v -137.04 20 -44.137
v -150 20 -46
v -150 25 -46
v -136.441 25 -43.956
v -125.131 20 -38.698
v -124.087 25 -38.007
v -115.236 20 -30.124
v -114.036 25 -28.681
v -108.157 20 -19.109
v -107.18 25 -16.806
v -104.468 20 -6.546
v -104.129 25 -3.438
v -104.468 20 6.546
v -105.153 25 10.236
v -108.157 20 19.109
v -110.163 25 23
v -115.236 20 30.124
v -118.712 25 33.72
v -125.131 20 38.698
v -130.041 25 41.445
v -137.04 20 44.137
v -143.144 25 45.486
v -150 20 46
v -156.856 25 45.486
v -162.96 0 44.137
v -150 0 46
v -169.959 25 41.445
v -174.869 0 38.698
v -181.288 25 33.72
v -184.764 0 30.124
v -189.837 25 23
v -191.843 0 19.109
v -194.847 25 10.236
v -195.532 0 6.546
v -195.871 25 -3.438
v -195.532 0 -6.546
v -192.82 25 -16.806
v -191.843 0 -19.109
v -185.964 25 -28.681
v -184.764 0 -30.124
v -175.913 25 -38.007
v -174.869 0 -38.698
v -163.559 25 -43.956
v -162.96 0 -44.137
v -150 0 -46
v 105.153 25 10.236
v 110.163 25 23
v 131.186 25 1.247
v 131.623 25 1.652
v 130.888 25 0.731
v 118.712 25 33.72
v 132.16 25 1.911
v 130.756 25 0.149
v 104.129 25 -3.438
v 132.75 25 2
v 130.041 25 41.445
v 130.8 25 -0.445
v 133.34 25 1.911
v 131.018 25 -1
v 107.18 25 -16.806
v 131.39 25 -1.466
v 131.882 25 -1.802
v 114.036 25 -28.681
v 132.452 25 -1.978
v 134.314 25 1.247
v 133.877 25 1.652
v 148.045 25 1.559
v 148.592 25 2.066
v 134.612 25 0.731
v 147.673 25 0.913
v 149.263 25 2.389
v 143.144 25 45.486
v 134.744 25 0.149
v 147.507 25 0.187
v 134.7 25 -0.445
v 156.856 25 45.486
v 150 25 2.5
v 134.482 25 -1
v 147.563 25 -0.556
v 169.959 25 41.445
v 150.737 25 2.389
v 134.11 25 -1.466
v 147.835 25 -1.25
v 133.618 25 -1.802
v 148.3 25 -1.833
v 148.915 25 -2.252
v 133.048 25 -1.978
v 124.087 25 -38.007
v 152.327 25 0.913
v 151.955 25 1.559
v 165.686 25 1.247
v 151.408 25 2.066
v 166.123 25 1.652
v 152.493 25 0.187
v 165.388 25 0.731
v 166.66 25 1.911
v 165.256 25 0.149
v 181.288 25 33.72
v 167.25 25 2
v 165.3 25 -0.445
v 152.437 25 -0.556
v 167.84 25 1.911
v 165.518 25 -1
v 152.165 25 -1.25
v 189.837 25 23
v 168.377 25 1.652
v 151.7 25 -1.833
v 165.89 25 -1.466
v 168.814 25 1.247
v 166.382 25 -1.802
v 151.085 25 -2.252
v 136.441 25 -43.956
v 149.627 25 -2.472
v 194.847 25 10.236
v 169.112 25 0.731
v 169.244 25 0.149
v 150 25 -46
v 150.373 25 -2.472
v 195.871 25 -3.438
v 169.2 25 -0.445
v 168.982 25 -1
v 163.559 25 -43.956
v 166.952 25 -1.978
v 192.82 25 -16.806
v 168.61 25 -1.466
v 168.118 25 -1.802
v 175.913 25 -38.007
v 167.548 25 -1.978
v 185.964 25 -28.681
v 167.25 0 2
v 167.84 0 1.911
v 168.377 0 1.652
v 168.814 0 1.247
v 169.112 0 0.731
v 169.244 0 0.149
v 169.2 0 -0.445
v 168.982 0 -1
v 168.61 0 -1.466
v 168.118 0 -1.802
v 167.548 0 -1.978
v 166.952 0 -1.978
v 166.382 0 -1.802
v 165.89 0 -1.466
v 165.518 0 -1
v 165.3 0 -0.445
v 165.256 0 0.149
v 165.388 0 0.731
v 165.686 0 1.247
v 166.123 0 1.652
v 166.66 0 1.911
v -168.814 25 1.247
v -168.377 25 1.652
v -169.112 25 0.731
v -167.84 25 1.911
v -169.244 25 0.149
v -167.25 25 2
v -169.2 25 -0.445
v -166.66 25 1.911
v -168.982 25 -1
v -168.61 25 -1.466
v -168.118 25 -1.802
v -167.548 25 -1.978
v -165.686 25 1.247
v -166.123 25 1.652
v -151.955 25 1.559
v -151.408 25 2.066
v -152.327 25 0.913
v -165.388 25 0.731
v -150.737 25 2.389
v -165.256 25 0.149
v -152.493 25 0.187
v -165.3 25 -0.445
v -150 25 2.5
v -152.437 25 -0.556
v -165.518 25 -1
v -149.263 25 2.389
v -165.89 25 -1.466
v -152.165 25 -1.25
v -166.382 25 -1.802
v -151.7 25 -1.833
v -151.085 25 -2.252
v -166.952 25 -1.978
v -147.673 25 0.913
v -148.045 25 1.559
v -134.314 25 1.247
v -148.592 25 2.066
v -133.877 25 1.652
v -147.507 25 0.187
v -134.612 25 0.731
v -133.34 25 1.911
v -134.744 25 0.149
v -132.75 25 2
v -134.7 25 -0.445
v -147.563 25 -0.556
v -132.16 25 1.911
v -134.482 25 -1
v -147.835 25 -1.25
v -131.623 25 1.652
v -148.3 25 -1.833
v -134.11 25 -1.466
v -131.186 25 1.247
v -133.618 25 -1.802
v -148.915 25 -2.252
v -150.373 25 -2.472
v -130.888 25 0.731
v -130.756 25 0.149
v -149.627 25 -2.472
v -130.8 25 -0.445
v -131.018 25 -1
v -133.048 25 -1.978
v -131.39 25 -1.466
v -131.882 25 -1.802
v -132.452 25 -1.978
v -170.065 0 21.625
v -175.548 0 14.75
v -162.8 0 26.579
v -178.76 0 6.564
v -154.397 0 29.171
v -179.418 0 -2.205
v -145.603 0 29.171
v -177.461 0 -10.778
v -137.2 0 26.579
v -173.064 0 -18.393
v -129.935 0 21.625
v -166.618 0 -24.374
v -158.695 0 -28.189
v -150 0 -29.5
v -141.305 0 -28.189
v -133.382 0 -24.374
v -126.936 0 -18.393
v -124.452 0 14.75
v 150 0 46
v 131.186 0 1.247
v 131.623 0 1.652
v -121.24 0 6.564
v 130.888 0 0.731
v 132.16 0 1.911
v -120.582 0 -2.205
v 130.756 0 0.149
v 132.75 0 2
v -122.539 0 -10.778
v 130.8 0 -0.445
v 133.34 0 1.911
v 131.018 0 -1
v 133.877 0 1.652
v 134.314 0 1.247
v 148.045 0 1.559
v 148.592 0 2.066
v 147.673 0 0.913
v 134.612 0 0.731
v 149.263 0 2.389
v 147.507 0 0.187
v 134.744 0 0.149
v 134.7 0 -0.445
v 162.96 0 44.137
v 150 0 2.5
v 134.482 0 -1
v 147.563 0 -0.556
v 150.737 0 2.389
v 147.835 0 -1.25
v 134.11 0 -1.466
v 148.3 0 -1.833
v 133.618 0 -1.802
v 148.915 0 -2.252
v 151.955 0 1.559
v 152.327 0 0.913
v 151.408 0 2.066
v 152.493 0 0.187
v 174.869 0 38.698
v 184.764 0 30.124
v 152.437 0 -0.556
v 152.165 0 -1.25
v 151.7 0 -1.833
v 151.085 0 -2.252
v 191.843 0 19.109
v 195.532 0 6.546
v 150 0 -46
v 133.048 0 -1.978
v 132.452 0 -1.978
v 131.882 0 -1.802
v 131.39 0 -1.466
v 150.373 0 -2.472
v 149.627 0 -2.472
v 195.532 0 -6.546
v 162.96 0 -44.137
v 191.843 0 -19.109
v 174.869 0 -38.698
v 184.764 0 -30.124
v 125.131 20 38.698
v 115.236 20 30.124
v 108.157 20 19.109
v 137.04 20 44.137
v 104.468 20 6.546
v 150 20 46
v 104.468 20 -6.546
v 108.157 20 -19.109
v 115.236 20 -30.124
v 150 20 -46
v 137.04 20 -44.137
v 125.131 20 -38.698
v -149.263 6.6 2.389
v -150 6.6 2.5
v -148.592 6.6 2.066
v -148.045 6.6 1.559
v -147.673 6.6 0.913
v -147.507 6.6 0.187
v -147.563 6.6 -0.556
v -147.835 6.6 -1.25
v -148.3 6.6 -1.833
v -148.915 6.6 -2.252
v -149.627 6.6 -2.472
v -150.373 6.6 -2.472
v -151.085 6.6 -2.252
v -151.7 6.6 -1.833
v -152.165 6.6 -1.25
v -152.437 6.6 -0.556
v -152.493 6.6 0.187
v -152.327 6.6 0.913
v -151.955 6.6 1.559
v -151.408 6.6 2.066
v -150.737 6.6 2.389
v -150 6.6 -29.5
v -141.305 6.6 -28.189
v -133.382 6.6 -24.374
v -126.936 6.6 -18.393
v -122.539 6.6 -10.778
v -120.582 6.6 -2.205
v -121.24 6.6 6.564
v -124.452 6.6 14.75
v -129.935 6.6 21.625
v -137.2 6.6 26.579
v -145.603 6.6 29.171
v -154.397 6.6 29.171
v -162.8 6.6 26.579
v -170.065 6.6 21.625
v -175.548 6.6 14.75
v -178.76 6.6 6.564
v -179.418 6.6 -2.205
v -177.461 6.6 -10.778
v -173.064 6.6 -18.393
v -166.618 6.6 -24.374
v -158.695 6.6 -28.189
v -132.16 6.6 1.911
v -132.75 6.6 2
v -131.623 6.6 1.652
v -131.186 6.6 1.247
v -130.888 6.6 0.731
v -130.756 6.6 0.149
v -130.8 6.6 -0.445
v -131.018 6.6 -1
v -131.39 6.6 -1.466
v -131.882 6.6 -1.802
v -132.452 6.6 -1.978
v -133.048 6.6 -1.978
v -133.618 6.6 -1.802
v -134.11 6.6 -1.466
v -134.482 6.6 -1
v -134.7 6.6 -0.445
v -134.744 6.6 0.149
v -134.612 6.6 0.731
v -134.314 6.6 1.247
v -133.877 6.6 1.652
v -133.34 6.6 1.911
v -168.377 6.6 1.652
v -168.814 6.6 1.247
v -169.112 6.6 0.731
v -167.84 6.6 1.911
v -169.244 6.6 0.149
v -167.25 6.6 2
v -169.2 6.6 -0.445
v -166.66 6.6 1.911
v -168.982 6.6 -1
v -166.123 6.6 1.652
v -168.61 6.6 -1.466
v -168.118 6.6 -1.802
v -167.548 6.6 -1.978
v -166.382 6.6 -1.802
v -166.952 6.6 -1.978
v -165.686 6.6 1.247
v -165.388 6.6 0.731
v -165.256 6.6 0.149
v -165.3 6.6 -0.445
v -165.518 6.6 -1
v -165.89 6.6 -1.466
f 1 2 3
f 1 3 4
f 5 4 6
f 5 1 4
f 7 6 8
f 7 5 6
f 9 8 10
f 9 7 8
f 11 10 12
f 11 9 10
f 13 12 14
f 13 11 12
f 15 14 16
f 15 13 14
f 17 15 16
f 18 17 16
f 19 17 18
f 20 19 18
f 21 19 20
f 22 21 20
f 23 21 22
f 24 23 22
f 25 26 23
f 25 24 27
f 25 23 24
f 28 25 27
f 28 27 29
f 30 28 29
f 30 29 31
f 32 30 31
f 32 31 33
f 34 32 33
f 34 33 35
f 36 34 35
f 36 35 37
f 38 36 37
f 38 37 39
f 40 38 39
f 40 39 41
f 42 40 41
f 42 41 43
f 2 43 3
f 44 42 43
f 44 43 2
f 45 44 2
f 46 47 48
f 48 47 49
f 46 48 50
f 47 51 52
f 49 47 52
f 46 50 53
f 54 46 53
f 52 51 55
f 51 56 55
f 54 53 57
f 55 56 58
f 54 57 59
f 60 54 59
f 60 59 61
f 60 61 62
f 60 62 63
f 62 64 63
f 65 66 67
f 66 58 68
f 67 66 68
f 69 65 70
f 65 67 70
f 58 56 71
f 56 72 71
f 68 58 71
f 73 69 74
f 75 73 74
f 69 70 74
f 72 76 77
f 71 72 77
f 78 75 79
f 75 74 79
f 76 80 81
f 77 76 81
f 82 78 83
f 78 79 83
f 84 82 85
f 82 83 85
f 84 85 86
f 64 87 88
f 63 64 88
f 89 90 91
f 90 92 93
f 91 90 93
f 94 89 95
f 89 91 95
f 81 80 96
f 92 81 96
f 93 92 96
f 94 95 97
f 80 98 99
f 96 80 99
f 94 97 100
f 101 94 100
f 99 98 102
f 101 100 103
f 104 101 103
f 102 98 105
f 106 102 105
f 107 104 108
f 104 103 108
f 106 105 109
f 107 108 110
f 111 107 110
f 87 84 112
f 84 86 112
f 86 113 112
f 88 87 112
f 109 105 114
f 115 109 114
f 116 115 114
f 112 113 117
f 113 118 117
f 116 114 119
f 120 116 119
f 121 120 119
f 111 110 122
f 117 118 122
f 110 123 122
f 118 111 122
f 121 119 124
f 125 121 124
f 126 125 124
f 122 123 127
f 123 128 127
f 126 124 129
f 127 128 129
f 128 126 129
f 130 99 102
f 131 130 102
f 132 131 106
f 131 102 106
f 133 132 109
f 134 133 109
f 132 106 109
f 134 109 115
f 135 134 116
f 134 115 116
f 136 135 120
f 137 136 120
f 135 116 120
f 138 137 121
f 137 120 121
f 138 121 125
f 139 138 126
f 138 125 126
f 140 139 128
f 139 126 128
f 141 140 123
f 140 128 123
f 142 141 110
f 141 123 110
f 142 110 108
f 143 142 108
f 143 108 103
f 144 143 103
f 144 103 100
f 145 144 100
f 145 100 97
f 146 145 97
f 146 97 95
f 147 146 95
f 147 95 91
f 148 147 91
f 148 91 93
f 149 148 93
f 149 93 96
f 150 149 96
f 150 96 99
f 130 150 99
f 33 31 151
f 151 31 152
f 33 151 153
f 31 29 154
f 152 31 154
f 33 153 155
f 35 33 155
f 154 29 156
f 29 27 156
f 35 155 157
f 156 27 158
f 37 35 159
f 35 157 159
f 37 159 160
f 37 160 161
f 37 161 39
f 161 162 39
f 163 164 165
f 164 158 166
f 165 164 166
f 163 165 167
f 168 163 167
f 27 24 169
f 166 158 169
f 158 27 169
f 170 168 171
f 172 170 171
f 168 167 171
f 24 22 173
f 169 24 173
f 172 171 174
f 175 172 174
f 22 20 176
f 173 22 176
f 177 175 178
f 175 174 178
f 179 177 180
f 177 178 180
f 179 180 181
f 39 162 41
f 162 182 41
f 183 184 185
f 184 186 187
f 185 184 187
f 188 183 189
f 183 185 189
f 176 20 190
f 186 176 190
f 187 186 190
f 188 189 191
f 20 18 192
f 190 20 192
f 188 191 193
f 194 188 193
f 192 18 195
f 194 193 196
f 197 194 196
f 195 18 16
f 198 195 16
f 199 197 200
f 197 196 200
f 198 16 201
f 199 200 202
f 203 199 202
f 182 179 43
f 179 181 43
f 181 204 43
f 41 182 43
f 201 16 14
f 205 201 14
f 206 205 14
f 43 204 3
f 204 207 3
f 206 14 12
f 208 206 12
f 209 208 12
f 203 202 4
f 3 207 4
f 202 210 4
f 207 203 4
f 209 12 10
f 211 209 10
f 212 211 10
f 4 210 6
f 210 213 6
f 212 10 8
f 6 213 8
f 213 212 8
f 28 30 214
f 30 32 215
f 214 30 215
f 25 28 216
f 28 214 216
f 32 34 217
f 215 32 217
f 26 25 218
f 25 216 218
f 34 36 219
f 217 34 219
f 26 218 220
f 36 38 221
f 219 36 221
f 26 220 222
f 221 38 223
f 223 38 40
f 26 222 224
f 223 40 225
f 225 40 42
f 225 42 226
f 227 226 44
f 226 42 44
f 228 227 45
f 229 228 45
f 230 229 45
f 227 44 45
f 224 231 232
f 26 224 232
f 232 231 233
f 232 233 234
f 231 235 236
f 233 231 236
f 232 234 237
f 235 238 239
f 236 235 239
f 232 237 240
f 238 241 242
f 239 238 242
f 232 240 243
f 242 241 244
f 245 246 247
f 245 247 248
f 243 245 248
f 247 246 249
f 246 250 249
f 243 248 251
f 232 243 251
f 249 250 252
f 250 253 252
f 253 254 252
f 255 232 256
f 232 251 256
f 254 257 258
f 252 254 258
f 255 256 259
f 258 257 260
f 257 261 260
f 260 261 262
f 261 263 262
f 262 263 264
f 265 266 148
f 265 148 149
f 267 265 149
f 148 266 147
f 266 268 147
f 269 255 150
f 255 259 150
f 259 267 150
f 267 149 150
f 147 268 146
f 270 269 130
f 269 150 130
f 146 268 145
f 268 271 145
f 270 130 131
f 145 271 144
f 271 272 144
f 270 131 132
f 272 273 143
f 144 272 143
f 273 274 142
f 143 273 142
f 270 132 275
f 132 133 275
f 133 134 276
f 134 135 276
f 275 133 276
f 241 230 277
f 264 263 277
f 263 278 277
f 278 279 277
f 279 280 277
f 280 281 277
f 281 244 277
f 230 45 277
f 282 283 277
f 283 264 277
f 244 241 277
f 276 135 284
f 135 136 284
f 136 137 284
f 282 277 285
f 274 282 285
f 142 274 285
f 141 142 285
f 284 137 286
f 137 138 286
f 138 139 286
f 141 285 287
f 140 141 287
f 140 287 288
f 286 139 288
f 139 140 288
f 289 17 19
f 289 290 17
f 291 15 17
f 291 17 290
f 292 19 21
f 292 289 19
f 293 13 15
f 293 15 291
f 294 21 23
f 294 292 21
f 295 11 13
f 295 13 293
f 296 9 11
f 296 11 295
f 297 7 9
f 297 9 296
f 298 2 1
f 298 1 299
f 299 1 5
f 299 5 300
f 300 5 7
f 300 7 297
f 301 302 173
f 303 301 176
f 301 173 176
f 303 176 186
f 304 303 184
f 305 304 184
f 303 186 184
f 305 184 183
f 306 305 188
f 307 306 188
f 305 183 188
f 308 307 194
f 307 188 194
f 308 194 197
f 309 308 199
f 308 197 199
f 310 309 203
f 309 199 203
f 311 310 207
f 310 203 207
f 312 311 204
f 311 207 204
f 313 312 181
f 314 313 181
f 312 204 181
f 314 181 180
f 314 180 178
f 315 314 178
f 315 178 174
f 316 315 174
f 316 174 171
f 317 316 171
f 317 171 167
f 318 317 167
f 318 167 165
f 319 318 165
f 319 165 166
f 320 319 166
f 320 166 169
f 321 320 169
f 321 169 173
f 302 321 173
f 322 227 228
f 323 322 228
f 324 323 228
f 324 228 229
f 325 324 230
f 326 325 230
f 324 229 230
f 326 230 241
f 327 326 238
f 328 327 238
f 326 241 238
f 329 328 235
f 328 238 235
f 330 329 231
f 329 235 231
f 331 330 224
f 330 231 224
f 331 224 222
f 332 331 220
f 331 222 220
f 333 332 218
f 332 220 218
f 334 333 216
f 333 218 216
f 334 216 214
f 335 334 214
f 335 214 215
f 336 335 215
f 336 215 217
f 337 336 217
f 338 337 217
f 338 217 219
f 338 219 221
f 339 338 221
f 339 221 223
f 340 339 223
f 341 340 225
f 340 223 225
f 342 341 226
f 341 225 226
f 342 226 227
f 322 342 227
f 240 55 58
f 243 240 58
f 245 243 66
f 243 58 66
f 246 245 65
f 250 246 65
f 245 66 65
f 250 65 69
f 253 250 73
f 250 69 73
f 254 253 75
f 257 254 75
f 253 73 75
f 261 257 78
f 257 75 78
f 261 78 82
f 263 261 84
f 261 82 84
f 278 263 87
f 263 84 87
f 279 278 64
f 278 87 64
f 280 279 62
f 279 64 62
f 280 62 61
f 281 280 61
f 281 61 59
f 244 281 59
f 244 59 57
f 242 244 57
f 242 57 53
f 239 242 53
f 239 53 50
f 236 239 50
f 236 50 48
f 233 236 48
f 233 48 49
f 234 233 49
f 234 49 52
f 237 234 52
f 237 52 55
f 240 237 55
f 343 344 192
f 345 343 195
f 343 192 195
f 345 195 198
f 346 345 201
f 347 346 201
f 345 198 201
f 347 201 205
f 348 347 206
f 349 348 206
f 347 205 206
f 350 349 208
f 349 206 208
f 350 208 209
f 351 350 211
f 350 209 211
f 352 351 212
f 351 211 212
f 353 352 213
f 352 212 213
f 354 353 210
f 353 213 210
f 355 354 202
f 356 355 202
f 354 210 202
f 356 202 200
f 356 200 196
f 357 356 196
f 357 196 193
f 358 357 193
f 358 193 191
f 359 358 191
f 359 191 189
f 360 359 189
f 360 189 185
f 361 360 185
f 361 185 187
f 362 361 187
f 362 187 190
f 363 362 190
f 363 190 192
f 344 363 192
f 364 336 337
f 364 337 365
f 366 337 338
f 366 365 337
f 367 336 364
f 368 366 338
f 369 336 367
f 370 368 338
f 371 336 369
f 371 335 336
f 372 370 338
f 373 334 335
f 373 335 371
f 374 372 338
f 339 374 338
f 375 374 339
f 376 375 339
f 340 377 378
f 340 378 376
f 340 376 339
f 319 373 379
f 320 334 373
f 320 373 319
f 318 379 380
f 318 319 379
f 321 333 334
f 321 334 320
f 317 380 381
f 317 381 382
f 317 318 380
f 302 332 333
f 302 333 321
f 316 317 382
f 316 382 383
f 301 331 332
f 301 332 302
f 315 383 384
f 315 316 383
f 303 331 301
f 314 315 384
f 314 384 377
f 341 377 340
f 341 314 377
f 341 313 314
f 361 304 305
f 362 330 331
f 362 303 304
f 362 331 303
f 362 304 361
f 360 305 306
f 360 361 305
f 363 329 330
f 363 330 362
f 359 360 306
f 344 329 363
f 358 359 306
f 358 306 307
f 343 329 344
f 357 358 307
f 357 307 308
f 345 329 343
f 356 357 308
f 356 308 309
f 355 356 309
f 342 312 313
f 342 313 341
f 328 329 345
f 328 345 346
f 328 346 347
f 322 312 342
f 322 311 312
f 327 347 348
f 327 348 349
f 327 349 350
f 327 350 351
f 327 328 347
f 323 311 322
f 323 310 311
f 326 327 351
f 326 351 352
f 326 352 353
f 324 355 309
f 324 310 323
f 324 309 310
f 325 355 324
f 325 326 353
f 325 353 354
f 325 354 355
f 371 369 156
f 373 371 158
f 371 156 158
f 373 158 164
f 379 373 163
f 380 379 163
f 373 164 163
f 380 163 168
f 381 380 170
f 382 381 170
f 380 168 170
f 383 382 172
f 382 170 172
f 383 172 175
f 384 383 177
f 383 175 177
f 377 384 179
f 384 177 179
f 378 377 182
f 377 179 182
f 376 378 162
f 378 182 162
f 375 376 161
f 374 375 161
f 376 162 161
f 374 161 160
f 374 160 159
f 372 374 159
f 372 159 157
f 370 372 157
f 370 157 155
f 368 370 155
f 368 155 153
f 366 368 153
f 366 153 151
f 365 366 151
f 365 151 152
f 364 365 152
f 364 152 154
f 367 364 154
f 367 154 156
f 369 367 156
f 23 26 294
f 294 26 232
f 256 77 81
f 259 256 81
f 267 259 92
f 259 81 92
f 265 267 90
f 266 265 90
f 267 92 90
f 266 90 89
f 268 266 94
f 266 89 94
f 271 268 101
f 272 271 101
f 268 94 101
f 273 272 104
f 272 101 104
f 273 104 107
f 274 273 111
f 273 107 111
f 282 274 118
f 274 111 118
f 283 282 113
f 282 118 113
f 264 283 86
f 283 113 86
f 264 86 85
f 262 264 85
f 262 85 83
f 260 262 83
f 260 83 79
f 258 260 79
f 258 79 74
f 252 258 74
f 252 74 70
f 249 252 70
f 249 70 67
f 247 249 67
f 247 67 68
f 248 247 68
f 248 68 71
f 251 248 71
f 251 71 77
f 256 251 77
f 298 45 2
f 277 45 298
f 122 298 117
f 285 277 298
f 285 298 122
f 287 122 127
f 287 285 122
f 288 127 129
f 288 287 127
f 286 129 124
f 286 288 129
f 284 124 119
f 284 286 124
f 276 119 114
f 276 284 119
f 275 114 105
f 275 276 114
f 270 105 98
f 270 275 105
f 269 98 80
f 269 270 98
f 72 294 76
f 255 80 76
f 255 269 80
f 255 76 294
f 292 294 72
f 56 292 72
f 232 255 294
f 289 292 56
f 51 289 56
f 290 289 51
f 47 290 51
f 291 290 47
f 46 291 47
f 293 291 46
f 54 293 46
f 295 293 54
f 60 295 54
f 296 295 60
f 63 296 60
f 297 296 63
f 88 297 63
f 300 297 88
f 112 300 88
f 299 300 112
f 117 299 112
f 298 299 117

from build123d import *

# Parameters (mm, degrees)
SKETCH_1_W          = 300
SKETCH_1_H          = 92
EXTRUDE_1_DEPTH     = 20
SKETCH_2_R          = 46
EXTRUDE_2_DEPTH     = 25
SKETCH_3_R          = 2.5
SKETCH_3_R_2        = 2
CUT_EXTRUDE_1_DEPTH = 203.871880752
SKETCH_4_R          = 2.5
SKETCH_4_R_2        = 2
CUT_EXTRUDE_2_DEPTH = 203.871880752
SKETCH_5_R          = 29.5
CUT_EXTRUDE_3_DEPTH = 6.6


with BuildPart() as part:
    # 草图1 → 凸台-拉伸1 (new body)
    with BuildSketch(Plane(origin=(0, 0, 0), x_dir=(1, 0, 0), z_dir=(0, 1, 0))):
        Rectangle(SKETCH_1_W, SKETCH_1_H)
    extrude(amount=EXTRUDE_1_DEPTH)

    # 草图2 → 凸台-拉伸2 (add)
    with BuildSketch(Plane.XZ):
        with Locations(Location((-150, 0, 0), (0, 0, 270))):
            Circle(SKETCH_2_R)
        with Locations(Location((150, 0, 0), (0, 0, 270))):
            Circle(SKETCH_2_R)
    extrude(amount=-EXTRUDE_2_DEPTH)

    # 草图3 → 切除-拉伸1 (cut, through all)
    with BuildSketch(Plane(origin=(0, 25, 0), x_dir=(1, 0, 0), z_dir=(0, 1, 0))):
        with Locations(Location((150, 0, 0), (0, 0, 270))):
            Circle(SKETCH_3_R)
        with Locations(Location((167.25, 0, 0), (0, 0, 270))):
            Circle(SKETCH_3_R_2)
        with Locations(Location((132.75, 0, 0), (0, 0, 270))):
            Circle(SKETCH_3_R_2)
    extrude(amount=-CUT_EXTRUDE_1_DEPTH, mode=Mode.SUBTRACT)

    # 草图4 → 切除-拉伸2 (cut, through all)
    with BuildSketch(Plane(origin=(0, 25, 0), x_dir=(1, 0, 0), z_dir=(0, 1, 0))):
        with Locations(Location((-150, 0, 0), (0, 0, 270))):
            Circle(SKETCH_4_R)
        with Locations(Location((-132.75, 0, 0), (0, 0, 270))):
            Circle(SKETCH_4_R_2)
        with Locations(Location((-167.25, 0, 0), (0, 0, 270))):
            Circle(SKETCH_4_R_2)
    extrude(amount=-CUT_EXTRUDE_2_DEPTH, mode=Mode.SUBTRACT)

    # 草图5 → 切除-拉伸3 (cut)
    with BuildSketch(Plane.XZ):
        with Locations(Location((-150, 0, 0), (0, 0, 270))):
            Circle(SKETCH_5_R)
    extrude(amount=-CUT_EXTRUDE_3_DEPTH, mode=Mode.SUBTRACT)


solid = part.part
